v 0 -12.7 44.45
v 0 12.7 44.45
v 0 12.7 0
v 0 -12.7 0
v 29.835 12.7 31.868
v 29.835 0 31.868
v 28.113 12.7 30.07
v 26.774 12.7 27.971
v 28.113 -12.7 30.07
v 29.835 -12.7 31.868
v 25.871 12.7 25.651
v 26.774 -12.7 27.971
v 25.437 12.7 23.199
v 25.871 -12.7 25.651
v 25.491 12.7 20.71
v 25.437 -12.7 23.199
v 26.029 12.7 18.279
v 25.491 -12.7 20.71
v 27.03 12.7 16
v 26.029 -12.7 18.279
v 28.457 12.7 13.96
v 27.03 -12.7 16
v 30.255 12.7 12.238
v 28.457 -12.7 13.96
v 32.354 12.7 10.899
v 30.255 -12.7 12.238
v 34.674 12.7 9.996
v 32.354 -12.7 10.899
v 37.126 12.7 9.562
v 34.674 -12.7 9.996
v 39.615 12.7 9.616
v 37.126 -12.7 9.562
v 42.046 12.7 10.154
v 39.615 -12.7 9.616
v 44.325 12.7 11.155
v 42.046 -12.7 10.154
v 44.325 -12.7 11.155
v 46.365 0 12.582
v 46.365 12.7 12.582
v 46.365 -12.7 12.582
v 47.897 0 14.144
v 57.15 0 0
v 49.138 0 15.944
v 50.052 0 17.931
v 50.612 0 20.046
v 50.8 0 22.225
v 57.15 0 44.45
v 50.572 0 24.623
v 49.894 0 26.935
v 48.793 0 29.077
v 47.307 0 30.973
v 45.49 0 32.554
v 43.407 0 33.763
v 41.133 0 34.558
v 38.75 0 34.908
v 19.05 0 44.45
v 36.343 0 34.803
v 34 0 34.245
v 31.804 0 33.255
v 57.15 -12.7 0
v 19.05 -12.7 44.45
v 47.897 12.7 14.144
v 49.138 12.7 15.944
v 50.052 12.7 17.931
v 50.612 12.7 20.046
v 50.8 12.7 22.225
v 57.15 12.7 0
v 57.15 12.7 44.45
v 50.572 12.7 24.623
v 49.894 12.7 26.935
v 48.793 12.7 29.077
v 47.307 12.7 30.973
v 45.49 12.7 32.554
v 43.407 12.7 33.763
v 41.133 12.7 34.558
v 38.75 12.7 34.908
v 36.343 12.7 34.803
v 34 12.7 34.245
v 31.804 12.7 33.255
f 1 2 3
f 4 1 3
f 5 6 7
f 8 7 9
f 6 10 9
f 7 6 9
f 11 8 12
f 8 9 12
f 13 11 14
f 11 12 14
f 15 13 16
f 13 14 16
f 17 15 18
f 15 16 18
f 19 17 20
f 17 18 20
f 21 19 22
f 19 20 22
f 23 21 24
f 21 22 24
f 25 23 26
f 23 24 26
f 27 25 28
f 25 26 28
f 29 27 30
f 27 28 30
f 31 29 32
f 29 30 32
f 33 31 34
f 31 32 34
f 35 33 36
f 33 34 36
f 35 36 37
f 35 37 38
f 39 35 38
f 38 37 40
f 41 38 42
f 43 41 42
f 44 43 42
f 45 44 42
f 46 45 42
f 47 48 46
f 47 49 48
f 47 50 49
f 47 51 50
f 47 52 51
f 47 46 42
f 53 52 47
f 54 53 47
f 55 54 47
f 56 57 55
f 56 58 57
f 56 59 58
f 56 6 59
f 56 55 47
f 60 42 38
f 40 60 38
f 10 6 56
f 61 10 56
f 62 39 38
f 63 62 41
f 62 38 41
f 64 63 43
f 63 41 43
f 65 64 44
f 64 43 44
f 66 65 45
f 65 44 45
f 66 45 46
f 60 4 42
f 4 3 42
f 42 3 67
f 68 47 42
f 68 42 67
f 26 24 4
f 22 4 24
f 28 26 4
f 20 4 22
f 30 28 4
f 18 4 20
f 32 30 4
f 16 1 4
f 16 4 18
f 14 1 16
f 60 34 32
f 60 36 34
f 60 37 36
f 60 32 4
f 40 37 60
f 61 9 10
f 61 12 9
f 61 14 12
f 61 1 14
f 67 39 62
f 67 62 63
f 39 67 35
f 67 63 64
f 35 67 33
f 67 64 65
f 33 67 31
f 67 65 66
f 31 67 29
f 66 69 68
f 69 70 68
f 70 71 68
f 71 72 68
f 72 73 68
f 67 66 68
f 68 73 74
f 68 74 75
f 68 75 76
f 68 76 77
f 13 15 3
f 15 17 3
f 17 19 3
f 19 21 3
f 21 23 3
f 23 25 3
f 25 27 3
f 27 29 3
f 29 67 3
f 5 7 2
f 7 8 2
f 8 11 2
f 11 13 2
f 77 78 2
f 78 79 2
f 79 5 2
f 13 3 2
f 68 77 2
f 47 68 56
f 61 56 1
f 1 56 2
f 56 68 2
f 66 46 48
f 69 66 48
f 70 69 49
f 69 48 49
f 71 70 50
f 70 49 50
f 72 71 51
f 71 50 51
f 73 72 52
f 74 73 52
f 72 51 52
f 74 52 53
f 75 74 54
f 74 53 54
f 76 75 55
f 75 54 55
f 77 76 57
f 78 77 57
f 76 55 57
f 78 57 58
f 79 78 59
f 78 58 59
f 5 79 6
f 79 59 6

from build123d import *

# Parameters (mm, degrees)
F0_W     = 12.7
F0_H     = 44.45
F1_DEPTH = 57.15
F3_DEPTH = 12.7
F5_DEPTH = 25.4


with BuildPart() as f1:
    # F0 (on Right) → F1 (new body)
    with BuildSketch(Plane.YZ):
        with Locations((6.35, 22.225)):
            Rectangle(F0_W, F0_H)
    extrude(amount=F1_DEPTH)

    # F2 (on face) → F3 (join)
    with BuildSketch(Plane.XZ):
        Polygon((0, 44.45), (0, 0), (57.15, 0), (19.05, 44.45), align=None)
    extrude(amount=F3_DEPTH)

    # F4 (on face) → F5 (cut)
    with BuildSketch(Plane.XZ.offset(12.7)):
        with BuildLine():
            Line((46.36505, 12.582441), (29.83495, 31.867559))
            ThreePointArc((29.83495, 31.867559), (28.457441, 13.95995), (46.36505, 12.582441))
        make_face()
        with BuildLine():
            ThreePointArc((46.36505, 12.582441), (49.638114, 16.918219), (50.8, 22.225))
            ThreePointArc((50.8, 22.225), (43.406781, 33.763114), (29.83495, 31.867559))
            Line((29.83495, 31.867559), (46.36505, 12.582441))
        make_face()
    extrude(amount=-F5_DEPTH, mode=Mode.SUBTRACT)


solid = f1.part
